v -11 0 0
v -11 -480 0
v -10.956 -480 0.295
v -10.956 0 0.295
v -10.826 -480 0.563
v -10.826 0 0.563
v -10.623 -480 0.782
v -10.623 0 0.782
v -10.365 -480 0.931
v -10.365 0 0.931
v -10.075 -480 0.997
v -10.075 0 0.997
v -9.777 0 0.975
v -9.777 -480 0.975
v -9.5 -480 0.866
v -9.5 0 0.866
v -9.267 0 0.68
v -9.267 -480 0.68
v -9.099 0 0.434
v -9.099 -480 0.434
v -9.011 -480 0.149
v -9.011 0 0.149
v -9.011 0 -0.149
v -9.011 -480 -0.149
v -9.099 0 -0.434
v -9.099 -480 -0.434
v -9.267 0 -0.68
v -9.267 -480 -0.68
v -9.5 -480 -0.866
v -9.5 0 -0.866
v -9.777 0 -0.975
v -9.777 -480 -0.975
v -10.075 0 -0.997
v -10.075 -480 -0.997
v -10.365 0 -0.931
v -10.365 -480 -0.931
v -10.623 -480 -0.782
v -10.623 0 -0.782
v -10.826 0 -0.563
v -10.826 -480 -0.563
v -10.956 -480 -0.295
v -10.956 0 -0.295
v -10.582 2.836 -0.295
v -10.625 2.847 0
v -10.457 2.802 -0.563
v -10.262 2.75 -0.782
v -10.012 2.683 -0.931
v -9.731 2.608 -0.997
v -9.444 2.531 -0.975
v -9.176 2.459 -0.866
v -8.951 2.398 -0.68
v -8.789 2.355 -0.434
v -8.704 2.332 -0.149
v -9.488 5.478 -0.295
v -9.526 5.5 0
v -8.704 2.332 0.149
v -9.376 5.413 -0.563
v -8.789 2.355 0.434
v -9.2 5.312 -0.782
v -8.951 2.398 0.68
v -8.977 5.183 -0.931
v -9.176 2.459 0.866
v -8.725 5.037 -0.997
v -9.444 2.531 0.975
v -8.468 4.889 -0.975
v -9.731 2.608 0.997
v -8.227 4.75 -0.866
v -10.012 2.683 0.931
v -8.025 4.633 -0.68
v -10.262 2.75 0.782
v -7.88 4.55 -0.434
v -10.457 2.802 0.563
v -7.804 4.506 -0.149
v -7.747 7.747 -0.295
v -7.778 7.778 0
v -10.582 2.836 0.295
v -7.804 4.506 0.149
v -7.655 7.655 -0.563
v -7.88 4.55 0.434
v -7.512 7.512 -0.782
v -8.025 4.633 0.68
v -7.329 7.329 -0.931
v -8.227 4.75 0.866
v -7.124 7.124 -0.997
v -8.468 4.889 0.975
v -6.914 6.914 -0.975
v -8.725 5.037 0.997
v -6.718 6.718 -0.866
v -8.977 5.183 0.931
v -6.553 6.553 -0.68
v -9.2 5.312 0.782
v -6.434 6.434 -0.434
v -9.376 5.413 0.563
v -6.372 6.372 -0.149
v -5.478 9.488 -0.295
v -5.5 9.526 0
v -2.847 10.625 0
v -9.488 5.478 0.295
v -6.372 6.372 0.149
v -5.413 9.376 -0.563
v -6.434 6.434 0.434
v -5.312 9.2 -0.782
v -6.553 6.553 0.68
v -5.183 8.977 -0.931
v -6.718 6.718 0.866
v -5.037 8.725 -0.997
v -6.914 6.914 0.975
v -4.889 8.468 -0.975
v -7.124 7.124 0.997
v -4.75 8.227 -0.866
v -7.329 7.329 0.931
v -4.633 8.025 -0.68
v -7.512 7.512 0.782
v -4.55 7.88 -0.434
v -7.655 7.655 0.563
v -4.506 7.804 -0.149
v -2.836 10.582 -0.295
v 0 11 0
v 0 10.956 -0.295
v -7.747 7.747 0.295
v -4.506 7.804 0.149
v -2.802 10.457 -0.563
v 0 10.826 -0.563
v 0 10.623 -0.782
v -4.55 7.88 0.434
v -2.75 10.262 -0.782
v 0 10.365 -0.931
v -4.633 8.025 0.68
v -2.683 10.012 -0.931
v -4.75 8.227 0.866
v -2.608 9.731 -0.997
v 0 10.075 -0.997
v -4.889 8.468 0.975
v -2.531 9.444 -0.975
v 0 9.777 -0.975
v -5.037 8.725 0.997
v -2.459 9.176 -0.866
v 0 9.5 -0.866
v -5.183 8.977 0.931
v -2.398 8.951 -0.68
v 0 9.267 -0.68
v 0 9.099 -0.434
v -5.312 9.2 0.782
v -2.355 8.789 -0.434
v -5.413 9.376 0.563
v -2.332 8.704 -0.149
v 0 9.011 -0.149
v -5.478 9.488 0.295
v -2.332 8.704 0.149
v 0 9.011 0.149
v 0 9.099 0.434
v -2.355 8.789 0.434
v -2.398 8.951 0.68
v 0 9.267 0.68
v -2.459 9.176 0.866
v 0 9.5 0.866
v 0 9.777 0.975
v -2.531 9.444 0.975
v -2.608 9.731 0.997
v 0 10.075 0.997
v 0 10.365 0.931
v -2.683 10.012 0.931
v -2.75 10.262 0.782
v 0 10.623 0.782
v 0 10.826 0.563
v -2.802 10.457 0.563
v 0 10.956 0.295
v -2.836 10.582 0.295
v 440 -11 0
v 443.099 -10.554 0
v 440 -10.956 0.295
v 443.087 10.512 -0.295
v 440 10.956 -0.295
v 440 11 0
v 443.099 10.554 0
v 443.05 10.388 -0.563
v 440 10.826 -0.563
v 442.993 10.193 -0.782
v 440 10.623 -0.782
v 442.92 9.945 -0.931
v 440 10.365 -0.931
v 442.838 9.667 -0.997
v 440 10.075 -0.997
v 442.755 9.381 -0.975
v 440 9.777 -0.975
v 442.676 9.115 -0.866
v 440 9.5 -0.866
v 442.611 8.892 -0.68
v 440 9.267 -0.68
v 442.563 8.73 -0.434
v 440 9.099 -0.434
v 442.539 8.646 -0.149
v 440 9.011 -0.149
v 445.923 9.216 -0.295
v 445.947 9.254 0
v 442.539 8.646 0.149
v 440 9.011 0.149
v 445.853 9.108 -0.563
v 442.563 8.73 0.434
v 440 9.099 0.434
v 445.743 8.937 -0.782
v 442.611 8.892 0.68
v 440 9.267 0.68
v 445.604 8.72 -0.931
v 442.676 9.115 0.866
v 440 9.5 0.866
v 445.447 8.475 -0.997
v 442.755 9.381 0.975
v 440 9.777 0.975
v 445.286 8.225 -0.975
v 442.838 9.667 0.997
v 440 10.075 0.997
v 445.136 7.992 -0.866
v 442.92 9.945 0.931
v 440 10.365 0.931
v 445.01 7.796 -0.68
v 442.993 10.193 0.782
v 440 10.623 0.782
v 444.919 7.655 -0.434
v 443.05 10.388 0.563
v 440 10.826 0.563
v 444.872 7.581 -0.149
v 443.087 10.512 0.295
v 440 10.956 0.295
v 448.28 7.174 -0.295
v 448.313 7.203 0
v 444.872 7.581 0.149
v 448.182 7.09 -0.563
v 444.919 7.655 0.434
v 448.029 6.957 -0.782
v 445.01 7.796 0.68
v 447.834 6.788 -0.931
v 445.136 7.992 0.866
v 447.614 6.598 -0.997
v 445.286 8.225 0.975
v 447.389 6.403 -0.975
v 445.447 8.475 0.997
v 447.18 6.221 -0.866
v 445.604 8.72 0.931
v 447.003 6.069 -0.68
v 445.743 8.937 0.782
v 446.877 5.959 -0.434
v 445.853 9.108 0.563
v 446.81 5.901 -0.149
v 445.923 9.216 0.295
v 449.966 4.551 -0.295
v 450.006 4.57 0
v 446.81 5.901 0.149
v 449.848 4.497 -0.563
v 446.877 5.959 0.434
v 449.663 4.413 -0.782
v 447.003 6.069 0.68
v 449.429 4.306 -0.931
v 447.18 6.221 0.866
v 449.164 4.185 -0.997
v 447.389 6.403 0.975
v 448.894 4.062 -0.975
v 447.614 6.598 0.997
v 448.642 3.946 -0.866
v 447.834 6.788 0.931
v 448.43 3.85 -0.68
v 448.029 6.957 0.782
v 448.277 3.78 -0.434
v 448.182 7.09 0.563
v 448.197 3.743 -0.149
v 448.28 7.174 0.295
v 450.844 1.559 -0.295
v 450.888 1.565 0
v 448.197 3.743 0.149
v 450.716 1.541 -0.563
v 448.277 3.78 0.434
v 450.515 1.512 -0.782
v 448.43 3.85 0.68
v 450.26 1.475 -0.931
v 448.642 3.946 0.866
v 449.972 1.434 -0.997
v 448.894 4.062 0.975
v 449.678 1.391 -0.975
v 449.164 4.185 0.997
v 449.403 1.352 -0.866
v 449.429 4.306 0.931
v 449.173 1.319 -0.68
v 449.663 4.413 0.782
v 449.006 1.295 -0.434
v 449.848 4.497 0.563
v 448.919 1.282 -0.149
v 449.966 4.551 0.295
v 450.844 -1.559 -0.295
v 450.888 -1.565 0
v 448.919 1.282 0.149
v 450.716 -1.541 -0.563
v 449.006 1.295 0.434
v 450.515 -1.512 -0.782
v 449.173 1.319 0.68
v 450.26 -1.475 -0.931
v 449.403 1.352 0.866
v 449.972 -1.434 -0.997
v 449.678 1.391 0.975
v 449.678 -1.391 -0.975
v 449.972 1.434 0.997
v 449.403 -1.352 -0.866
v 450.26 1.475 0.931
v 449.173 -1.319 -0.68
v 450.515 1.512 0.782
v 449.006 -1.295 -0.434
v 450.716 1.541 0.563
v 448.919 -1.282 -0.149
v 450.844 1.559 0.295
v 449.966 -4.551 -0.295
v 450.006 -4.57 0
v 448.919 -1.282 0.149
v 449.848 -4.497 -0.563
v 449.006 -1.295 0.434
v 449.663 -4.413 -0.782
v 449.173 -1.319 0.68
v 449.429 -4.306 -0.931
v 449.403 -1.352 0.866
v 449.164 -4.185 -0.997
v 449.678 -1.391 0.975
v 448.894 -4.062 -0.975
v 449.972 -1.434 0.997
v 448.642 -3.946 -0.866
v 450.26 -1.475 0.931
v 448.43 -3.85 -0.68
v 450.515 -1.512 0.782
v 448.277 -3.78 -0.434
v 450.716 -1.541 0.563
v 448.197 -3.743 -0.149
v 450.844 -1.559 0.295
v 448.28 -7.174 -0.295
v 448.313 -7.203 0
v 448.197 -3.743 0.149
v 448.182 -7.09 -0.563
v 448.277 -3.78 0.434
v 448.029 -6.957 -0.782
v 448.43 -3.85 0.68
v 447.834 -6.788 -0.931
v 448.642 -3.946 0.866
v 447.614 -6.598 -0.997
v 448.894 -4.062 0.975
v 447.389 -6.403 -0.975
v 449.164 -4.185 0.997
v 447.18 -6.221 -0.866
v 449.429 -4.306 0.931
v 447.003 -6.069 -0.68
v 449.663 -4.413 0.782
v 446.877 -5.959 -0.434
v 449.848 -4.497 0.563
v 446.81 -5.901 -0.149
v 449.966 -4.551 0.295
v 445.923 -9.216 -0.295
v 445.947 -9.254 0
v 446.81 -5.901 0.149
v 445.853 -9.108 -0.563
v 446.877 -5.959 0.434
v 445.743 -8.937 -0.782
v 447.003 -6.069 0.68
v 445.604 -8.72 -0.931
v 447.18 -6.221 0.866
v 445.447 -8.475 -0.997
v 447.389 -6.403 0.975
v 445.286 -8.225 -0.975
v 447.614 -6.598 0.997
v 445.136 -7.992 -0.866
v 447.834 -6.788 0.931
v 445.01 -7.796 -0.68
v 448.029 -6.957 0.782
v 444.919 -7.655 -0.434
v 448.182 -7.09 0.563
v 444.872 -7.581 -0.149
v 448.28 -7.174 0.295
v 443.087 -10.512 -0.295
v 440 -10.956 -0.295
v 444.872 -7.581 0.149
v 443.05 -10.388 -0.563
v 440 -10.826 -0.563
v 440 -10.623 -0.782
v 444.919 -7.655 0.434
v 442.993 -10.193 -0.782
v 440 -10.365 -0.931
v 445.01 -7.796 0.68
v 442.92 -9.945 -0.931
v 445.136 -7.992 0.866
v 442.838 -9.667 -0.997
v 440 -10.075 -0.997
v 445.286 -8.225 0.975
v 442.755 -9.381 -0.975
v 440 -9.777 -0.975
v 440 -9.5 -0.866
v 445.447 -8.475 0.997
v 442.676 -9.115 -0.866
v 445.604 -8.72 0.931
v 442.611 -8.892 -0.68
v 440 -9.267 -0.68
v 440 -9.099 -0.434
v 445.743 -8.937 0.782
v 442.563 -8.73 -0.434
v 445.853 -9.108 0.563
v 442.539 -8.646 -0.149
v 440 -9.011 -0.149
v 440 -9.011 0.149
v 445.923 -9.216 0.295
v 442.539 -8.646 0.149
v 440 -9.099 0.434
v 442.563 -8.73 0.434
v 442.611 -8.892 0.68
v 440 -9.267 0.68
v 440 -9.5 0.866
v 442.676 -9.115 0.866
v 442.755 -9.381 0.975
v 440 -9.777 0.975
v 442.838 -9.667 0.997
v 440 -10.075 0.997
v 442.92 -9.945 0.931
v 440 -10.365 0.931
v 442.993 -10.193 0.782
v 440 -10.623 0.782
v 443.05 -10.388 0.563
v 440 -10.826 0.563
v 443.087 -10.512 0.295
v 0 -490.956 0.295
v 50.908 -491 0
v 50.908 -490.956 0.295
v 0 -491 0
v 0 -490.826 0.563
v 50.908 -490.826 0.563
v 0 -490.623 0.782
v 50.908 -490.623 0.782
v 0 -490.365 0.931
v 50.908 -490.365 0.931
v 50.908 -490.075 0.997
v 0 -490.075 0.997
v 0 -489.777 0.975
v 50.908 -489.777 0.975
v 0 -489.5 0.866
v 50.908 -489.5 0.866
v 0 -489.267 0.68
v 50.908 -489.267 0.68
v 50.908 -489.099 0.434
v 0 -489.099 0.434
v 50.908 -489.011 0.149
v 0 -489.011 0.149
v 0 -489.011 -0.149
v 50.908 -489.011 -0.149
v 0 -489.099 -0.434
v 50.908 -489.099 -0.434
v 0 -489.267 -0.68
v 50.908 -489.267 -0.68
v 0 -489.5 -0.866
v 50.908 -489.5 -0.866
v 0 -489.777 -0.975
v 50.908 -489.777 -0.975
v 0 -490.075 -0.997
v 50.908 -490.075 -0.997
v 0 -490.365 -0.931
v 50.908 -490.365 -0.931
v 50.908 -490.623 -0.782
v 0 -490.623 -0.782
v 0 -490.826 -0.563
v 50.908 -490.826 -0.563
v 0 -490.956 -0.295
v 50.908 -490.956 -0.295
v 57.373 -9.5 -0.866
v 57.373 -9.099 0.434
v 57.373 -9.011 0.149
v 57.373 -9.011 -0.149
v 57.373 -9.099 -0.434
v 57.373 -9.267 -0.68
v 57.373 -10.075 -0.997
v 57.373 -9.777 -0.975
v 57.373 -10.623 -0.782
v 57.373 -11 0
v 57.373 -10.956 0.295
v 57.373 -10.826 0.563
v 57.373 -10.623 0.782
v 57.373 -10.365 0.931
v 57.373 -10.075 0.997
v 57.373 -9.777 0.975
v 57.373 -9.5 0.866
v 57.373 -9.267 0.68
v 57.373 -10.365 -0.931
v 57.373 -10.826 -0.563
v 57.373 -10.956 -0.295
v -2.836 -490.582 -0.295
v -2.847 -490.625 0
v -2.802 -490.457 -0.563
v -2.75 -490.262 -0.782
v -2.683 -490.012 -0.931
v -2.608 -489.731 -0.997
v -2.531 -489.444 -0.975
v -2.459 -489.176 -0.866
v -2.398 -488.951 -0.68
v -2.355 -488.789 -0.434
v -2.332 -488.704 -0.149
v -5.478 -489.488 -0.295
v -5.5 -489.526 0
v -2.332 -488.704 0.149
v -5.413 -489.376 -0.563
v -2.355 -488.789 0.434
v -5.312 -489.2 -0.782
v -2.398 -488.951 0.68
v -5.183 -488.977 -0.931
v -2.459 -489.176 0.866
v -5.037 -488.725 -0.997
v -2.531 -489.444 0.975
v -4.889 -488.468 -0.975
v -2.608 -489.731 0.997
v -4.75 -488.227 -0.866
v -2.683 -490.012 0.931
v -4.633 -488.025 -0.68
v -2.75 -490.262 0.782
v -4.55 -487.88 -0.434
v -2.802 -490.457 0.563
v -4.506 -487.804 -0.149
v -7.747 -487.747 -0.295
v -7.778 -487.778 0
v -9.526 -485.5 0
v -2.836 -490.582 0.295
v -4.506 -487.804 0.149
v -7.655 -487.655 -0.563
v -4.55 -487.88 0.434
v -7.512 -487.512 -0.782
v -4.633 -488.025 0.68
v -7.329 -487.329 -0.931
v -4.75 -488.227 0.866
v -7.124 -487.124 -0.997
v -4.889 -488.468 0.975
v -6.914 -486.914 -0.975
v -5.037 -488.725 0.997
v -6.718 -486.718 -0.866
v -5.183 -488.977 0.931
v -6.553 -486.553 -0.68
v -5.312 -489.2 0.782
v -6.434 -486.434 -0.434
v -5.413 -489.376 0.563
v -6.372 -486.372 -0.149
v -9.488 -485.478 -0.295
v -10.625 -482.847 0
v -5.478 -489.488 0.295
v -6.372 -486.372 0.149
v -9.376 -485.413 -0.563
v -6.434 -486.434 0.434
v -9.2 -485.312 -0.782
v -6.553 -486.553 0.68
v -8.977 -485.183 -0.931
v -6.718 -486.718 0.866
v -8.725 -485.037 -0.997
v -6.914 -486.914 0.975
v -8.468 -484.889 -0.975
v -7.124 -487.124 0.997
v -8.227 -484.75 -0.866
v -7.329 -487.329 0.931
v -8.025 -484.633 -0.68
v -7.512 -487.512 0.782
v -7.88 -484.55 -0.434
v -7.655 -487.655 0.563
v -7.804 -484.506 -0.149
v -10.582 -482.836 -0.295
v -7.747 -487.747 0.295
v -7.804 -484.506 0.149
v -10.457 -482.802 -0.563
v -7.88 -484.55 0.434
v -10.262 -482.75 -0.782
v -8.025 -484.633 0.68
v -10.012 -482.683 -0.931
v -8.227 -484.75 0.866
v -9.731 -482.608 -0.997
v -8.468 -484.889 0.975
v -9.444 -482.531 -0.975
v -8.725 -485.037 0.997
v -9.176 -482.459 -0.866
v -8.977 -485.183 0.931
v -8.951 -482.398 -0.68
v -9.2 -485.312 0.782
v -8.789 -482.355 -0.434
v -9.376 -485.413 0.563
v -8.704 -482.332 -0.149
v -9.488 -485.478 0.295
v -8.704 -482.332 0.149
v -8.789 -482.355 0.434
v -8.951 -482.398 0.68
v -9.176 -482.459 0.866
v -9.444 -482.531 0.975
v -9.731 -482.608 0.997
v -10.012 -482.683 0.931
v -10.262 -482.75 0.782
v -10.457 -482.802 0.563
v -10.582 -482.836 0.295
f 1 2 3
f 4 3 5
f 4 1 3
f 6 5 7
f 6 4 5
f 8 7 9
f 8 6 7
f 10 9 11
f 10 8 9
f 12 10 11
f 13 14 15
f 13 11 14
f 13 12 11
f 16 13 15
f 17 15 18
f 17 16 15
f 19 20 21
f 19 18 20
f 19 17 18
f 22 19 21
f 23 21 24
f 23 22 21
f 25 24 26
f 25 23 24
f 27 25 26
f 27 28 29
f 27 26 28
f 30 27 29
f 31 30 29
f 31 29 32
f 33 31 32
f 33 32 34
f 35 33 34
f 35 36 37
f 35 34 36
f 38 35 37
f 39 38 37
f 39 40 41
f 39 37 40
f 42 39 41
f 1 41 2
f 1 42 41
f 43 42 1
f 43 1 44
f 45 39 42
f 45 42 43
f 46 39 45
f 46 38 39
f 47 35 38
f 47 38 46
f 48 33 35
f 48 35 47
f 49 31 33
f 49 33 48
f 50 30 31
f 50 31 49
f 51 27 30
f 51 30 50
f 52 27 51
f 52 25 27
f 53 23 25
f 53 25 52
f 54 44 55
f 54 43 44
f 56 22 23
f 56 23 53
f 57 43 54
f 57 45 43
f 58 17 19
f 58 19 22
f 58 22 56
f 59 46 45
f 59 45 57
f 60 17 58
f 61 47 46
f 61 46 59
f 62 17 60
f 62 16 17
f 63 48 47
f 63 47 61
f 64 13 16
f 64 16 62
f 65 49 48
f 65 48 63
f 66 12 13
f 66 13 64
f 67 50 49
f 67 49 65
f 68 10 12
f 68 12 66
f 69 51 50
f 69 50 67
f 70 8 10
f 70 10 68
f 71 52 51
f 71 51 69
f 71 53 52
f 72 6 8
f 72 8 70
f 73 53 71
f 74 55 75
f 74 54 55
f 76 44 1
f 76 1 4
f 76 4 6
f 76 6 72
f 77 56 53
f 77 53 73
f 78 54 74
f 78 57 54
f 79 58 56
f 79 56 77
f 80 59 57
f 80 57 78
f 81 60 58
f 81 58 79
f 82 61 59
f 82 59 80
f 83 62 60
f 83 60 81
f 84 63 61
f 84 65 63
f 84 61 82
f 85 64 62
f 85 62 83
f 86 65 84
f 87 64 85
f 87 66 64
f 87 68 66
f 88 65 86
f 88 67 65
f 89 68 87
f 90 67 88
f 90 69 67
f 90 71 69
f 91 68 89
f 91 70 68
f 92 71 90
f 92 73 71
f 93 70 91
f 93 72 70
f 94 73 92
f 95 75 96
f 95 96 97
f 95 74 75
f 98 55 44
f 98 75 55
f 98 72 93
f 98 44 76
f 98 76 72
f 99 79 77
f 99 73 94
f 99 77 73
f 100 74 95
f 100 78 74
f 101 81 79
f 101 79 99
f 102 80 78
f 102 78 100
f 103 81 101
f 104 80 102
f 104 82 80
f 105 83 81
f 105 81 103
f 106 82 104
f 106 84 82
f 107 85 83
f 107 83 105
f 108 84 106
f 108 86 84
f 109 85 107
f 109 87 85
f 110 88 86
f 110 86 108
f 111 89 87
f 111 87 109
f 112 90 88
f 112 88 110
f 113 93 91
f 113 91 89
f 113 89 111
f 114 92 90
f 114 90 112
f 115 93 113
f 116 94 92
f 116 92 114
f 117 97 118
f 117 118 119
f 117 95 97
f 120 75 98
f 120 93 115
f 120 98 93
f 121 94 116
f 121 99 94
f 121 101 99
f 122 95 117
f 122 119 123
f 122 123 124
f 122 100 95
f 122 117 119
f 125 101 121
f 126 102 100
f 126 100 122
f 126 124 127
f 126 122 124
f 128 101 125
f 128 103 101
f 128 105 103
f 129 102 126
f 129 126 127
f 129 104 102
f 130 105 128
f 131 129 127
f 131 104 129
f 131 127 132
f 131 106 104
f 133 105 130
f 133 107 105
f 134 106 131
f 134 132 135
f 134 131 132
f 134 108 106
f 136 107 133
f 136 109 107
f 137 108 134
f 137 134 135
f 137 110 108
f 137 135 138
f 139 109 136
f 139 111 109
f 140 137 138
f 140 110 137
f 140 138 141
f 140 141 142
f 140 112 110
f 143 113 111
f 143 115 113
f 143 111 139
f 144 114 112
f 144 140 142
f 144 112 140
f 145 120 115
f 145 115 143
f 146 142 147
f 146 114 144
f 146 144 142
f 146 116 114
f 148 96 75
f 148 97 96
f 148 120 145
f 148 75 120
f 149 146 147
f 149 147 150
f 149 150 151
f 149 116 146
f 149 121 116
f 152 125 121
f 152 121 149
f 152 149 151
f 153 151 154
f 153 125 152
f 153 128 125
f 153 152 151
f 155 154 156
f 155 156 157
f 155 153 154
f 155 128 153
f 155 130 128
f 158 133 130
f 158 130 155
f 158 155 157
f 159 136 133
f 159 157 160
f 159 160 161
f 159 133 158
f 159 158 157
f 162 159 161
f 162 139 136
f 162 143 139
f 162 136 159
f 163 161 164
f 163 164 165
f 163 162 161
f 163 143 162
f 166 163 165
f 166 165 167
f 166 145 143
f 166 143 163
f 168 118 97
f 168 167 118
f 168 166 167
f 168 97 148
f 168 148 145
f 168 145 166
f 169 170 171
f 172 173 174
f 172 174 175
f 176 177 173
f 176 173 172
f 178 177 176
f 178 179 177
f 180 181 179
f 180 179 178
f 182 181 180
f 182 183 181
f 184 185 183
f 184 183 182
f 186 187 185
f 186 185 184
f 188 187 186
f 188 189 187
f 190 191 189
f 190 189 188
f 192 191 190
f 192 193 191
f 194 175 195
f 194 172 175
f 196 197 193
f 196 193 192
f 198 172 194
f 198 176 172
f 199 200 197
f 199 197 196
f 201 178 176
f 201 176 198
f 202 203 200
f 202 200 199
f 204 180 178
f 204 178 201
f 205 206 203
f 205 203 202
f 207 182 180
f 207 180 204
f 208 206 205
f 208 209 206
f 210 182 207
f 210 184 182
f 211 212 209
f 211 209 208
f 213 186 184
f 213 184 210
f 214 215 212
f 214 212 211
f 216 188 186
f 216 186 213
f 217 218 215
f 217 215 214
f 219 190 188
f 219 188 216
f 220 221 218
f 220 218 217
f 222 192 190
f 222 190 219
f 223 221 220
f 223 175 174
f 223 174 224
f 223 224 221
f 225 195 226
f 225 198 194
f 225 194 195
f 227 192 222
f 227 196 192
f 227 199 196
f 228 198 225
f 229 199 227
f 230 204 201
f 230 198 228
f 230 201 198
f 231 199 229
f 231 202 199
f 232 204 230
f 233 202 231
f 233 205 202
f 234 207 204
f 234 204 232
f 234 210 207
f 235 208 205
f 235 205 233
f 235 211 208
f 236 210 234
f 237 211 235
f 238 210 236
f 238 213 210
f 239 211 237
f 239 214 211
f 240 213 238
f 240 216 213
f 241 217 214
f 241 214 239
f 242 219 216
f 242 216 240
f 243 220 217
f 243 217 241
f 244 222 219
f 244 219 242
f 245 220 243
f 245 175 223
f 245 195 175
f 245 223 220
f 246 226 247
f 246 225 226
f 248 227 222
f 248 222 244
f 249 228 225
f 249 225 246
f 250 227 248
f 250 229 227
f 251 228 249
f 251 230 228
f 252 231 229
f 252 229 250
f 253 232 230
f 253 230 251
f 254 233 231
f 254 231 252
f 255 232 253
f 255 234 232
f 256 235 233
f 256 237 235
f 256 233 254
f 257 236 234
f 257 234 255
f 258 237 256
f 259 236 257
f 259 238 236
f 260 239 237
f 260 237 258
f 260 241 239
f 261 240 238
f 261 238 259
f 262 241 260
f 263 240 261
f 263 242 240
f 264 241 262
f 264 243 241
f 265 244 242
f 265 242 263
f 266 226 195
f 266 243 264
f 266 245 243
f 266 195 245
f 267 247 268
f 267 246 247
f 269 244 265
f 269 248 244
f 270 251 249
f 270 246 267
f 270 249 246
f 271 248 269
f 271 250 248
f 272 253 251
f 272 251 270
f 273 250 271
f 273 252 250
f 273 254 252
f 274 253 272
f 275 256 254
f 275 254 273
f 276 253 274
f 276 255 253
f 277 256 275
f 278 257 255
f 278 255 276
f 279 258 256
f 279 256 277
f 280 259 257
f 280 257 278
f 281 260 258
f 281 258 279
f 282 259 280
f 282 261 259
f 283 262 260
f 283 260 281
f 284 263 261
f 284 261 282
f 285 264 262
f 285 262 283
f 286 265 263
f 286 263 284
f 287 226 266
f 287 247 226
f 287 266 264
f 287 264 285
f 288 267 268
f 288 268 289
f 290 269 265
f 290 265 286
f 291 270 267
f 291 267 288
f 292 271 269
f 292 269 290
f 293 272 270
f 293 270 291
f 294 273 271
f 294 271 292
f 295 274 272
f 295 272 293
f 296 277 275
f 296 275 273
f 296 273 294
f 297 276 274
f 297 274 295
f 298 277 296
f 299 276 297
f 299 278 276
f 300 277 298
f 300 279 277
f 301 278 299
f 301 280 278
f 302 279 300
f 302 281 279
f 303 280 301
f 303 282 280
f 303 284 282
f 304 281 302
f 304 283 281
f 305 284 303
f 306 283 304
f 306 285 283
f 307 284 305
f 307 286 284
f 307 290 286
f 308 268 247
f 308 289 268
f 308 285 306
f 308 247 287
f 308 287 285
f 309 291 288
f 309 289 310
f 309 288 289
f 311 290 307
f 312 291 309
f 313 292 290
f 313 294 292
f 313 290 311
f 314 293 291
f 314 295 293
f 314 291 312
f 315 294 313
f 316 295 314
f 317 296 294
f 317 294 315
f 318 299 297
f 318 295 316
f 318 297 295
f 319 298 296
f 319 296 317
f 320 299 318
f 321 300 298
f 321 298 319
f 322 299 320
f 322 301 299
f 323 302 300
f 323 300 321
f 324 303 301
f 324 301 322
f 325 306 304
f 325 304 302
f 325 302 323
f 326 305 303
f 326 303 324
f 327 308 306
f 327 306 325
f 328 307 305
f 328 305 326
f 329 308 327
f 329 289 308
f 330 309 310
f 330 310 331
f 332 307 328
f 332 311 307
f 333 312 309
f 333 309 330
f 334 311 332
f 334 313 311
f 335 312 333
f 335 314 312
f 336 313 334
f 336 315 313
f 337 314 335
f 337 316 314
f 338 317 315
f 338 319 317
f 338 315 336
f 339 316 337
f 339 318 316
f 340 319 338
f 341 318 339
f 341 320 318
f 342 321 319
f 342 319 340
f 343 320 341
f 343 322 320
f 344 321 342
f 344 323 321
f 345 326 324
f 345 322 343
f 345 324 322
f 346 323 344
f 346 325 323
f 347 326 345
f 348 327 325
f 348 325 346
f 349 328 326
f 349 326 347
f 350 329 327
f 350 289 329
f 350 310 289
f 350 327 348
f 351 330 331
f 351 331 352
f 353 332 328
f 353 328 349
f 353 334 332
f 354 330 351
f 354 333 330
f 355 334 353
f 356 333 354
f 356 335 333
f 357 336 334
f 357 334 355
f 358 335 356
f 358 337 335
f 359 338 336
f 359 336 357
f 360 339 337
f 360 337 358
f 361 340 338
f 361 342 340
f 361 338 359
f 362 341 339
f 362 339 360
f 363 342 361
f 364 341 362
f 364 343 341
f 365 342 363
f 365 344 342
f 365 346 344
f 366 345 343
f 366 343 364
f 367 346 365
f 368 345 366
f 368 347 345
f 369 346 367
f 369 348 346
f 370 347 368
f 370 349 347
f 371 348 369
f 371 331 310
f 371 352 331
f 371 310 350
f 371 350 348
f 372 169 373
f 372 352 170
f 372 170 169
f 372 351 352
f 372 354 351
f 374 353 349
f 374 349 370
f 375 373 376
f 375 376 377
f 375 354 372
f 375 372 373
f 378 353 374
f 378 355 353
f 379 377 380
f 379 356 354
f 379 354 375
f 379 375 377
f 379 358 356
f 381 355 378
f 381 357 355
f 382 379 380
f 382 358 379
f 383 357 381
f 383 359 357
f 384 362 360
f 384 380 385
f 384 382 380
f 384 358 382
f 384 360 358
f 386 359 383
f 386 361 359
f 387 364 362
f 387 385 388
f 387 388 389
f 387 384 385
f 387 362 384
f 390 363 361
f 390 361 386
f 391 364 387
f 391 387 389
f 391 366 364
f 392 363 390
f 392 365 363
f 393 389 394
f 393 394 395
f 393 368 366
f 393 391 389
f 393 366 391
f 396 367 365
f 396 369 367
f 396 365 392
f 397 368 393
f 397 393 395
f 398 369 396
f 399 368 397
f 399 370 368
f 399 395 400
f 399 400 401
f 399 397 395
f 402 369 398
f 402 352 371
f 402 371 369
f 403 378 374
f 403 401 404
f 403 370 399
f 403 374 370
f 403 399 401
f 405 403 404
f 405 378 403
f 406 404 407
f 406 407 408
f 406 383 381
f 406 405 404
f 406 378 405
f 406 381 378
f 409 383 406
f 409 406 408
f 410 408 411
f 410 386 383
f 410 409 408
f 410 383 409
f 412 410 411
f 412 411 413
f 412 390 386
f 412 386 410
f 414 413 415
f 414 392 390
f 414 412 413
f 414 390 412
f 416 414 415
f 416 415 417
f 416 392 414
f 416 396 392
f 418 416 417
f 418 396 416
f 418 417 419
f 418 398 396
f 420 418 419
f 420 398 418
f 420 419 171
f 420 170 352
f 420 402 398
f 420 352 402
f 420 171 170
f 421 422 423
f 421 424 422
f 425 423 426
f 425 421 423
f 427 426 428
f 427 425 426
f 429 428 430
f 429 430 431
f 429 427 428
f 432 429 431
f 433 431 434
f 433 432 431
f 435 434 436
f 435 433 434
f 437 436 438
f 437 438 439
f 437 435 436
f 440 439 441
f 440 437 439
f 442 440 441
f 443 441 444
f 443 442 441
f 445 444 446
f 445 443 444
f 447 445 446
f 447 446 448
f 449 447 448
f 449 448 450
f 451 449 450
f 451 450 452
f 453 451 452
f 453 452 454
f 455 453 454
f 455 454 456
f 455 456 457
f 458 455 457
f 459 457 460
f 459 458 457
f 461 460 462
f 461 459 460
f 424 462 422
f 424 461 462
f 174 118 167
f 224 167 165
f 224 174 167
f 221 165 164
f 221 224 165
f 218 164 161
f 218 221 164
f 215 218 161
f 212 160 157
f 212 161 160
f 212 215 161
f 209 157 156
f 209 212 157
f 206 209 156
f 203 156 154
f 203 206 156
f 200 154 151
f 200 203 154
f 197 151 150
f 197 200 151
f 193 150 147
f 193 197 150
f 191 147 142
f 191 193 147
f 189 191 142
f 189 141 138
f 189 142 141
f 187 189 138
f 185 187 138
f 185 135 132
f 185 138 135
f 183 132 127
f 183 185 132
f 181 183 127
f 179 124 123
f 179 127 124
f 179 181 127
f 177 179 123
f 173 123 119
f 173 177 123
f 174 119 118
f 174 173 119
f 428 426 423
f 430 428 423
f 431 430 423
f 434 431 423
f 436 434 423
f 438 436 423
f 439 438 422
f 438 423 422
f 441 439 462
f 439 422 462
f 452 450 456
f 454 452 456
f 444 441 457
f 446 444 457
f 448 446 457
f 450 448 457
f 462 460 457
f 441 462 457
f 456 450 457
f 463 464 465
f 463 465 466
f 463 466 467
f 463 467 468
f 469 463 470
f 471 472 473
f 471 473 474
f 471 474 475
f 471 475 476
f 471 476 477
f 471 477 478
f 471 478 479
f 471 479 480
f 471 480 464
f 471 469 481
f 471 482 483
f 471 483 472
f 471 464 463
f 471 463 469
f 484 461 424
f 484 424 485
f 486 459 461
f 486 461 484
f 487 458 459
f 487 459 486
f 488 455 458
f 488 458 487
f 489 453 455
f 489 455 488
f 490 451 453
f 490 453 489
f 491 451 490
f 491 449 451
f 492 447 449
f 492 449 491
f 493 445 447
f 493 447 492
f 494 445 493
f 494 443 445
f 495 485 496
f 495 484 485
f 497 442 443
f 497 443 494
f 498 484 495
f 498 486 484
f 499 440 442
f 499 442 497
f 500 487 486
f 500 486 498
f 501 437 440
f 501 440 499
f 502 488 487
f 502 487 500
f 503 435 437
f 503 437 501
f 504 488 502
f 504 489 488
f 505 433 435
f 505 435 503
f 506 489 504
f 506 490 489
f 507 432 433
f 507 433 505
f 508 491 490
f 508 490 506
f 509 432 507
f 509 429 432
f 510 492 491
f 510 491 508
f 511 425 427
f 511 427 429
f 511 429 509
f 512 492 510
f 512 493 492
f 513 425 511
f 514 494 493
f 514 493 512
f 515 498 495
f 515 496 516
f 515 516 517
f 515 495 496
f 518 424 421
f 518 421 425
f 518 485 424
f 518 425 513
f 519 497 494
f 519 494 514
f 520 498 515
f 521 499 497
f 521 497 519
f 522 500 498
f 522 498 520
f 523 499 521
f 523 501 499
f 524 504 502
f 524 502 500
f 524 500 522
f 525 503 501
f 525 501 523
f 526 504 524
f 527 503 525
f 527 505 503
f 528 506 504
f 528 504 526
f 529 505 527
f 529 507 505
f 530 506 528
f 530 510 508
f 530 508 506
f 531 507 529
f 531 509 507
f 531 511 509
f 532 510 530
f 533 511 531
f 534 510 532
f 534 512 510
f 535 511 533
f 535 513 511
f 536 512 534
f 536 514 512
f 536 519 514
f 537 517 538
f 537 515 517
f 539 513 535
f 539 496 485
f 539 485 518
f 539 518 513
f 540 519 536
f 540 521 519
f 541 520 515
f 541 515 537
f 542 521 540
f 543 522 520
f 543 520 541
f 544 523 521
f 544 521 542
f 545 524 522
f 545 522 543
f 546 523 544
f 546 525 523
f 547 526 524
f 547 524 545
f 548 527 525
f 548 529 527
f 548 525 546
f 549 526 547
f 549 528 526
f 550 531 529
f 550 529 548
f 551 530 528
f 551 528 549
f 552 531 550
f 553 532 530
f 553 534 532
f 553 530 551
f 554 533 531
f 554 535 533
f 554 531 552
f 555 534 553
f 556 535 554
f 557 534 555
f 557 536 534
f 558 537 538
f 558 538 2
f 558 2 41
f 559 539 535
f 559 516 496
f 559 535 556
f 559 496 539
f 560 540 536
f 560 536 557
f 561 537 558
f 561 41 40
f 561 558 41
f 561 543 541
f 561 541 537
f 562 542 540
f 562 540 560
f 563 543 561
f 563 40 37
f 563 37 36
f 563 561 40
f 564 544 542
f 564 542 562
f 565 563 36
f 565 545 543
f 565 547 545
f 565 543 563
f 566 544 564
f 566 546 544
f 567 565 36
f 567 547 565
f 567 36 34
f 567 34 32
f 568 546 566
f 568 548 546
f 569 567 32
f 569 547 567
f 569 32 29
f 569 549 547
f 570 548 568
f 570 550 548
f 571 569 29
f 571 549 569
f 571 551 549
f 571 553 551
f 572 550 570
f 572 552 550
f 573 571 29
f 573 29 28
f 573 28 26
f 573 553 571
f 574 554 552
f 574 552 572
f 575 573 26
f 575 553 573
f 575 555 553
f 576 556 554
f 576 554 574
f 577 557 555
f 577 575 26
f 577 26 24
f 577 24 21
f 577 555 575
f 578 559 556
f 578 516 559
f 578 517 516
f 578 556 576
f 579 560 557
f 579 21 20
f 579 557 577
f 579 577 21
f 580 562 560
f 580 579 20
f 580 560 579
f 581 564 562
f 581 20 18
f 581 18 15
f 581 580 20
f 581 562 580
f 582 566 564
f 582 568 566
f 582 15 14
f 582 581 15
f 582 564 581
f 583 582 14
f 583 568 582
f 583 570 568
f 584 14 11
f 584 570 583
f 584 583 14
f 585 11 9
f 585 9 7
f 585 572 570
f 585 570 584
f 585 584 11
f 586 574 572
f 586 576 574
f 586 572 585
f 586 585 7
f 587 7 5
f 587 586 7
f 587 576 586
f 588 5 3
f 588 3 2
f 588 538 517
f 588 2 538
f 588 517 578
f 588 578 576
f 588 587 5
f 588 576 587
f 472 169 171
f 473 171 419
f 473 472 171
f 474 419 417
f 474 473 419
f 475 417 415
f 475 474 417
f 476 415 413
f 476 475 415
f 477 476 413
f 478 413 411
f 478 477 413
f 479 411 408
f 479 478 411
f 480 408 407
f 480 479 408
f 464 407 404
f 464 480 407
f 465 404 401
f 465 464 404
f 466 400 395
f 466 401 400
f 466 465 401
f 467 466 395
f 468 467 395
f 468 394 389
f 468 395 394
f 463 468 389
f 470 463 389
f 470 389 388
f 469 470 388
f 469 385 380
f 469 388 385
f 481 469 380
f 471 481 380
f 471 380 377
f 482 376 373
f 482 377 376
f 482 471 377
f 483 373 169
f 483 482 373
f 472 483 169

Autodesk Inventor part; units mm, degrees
ref_plane "YZ Plane" through (0, 0, 0) normal (1, 0, 0) x (0, 1, 0)
ref_plane "XZ Plane" through (0, 0, 0) normal (0, 1, 0) x (-1, 0, 0)
ref_plane "XY Plane" through (0, 0, 0) normal (0, 0, 1) x (1, 0, 0)
ref_plane "Arbeitsebene1" through (0, 0, 0) normal (0, 0, 1) x (1, 0, 0)
sketch "Skizze5" plane through (0, 0, 0) normal (0, 0, 1) x (1, 0, 0)
  circle A0 centre (0, 0) radius 10 projected
  circle A1 centre (440, 0) radius 10 projected
  line L0 (440, 10) -> (0, 10)
  arc A2 (0, 10) -> (-10, 0) centre (0, 0) ccw
  arc A3 (440, -10) -> (440, 10) centre (440, 0) ccw
  line L1 (440, -10) -> (57.3732, -10)
  circle A4 centre (0, -480) radius 10 projected
  line L2 (-10, 0) -> (-10, -480)
  line L3 (0, -490) -> (50.9075, -490)
  arc A5 (-10, -480) -> (0, -490) centre (0, -480) ccw
  arc A6 (440, -10) -> (440, 10) centre (440, 0) ccw
  point P0 (0, 0)
ref_plane "Arbeitsebene4" through (57.3732, -10, 0) normal (-1, 0, 0) x (0, -1, 0)
sketch "Skizze6" plane through (57.3732, -10, 0) normal (-1, 0, 0) x (0, -1, 0)
  circle A0 centre (0, 0) radius 1
  point P0 (-10, 0)
  dimension "d3" = 2
sweep "Sweeping2" add profiles "Skizze6" path "Skizze5" path curves L1 A6 L0 A2 L2 A5 L3
properties part number "Seil1"
